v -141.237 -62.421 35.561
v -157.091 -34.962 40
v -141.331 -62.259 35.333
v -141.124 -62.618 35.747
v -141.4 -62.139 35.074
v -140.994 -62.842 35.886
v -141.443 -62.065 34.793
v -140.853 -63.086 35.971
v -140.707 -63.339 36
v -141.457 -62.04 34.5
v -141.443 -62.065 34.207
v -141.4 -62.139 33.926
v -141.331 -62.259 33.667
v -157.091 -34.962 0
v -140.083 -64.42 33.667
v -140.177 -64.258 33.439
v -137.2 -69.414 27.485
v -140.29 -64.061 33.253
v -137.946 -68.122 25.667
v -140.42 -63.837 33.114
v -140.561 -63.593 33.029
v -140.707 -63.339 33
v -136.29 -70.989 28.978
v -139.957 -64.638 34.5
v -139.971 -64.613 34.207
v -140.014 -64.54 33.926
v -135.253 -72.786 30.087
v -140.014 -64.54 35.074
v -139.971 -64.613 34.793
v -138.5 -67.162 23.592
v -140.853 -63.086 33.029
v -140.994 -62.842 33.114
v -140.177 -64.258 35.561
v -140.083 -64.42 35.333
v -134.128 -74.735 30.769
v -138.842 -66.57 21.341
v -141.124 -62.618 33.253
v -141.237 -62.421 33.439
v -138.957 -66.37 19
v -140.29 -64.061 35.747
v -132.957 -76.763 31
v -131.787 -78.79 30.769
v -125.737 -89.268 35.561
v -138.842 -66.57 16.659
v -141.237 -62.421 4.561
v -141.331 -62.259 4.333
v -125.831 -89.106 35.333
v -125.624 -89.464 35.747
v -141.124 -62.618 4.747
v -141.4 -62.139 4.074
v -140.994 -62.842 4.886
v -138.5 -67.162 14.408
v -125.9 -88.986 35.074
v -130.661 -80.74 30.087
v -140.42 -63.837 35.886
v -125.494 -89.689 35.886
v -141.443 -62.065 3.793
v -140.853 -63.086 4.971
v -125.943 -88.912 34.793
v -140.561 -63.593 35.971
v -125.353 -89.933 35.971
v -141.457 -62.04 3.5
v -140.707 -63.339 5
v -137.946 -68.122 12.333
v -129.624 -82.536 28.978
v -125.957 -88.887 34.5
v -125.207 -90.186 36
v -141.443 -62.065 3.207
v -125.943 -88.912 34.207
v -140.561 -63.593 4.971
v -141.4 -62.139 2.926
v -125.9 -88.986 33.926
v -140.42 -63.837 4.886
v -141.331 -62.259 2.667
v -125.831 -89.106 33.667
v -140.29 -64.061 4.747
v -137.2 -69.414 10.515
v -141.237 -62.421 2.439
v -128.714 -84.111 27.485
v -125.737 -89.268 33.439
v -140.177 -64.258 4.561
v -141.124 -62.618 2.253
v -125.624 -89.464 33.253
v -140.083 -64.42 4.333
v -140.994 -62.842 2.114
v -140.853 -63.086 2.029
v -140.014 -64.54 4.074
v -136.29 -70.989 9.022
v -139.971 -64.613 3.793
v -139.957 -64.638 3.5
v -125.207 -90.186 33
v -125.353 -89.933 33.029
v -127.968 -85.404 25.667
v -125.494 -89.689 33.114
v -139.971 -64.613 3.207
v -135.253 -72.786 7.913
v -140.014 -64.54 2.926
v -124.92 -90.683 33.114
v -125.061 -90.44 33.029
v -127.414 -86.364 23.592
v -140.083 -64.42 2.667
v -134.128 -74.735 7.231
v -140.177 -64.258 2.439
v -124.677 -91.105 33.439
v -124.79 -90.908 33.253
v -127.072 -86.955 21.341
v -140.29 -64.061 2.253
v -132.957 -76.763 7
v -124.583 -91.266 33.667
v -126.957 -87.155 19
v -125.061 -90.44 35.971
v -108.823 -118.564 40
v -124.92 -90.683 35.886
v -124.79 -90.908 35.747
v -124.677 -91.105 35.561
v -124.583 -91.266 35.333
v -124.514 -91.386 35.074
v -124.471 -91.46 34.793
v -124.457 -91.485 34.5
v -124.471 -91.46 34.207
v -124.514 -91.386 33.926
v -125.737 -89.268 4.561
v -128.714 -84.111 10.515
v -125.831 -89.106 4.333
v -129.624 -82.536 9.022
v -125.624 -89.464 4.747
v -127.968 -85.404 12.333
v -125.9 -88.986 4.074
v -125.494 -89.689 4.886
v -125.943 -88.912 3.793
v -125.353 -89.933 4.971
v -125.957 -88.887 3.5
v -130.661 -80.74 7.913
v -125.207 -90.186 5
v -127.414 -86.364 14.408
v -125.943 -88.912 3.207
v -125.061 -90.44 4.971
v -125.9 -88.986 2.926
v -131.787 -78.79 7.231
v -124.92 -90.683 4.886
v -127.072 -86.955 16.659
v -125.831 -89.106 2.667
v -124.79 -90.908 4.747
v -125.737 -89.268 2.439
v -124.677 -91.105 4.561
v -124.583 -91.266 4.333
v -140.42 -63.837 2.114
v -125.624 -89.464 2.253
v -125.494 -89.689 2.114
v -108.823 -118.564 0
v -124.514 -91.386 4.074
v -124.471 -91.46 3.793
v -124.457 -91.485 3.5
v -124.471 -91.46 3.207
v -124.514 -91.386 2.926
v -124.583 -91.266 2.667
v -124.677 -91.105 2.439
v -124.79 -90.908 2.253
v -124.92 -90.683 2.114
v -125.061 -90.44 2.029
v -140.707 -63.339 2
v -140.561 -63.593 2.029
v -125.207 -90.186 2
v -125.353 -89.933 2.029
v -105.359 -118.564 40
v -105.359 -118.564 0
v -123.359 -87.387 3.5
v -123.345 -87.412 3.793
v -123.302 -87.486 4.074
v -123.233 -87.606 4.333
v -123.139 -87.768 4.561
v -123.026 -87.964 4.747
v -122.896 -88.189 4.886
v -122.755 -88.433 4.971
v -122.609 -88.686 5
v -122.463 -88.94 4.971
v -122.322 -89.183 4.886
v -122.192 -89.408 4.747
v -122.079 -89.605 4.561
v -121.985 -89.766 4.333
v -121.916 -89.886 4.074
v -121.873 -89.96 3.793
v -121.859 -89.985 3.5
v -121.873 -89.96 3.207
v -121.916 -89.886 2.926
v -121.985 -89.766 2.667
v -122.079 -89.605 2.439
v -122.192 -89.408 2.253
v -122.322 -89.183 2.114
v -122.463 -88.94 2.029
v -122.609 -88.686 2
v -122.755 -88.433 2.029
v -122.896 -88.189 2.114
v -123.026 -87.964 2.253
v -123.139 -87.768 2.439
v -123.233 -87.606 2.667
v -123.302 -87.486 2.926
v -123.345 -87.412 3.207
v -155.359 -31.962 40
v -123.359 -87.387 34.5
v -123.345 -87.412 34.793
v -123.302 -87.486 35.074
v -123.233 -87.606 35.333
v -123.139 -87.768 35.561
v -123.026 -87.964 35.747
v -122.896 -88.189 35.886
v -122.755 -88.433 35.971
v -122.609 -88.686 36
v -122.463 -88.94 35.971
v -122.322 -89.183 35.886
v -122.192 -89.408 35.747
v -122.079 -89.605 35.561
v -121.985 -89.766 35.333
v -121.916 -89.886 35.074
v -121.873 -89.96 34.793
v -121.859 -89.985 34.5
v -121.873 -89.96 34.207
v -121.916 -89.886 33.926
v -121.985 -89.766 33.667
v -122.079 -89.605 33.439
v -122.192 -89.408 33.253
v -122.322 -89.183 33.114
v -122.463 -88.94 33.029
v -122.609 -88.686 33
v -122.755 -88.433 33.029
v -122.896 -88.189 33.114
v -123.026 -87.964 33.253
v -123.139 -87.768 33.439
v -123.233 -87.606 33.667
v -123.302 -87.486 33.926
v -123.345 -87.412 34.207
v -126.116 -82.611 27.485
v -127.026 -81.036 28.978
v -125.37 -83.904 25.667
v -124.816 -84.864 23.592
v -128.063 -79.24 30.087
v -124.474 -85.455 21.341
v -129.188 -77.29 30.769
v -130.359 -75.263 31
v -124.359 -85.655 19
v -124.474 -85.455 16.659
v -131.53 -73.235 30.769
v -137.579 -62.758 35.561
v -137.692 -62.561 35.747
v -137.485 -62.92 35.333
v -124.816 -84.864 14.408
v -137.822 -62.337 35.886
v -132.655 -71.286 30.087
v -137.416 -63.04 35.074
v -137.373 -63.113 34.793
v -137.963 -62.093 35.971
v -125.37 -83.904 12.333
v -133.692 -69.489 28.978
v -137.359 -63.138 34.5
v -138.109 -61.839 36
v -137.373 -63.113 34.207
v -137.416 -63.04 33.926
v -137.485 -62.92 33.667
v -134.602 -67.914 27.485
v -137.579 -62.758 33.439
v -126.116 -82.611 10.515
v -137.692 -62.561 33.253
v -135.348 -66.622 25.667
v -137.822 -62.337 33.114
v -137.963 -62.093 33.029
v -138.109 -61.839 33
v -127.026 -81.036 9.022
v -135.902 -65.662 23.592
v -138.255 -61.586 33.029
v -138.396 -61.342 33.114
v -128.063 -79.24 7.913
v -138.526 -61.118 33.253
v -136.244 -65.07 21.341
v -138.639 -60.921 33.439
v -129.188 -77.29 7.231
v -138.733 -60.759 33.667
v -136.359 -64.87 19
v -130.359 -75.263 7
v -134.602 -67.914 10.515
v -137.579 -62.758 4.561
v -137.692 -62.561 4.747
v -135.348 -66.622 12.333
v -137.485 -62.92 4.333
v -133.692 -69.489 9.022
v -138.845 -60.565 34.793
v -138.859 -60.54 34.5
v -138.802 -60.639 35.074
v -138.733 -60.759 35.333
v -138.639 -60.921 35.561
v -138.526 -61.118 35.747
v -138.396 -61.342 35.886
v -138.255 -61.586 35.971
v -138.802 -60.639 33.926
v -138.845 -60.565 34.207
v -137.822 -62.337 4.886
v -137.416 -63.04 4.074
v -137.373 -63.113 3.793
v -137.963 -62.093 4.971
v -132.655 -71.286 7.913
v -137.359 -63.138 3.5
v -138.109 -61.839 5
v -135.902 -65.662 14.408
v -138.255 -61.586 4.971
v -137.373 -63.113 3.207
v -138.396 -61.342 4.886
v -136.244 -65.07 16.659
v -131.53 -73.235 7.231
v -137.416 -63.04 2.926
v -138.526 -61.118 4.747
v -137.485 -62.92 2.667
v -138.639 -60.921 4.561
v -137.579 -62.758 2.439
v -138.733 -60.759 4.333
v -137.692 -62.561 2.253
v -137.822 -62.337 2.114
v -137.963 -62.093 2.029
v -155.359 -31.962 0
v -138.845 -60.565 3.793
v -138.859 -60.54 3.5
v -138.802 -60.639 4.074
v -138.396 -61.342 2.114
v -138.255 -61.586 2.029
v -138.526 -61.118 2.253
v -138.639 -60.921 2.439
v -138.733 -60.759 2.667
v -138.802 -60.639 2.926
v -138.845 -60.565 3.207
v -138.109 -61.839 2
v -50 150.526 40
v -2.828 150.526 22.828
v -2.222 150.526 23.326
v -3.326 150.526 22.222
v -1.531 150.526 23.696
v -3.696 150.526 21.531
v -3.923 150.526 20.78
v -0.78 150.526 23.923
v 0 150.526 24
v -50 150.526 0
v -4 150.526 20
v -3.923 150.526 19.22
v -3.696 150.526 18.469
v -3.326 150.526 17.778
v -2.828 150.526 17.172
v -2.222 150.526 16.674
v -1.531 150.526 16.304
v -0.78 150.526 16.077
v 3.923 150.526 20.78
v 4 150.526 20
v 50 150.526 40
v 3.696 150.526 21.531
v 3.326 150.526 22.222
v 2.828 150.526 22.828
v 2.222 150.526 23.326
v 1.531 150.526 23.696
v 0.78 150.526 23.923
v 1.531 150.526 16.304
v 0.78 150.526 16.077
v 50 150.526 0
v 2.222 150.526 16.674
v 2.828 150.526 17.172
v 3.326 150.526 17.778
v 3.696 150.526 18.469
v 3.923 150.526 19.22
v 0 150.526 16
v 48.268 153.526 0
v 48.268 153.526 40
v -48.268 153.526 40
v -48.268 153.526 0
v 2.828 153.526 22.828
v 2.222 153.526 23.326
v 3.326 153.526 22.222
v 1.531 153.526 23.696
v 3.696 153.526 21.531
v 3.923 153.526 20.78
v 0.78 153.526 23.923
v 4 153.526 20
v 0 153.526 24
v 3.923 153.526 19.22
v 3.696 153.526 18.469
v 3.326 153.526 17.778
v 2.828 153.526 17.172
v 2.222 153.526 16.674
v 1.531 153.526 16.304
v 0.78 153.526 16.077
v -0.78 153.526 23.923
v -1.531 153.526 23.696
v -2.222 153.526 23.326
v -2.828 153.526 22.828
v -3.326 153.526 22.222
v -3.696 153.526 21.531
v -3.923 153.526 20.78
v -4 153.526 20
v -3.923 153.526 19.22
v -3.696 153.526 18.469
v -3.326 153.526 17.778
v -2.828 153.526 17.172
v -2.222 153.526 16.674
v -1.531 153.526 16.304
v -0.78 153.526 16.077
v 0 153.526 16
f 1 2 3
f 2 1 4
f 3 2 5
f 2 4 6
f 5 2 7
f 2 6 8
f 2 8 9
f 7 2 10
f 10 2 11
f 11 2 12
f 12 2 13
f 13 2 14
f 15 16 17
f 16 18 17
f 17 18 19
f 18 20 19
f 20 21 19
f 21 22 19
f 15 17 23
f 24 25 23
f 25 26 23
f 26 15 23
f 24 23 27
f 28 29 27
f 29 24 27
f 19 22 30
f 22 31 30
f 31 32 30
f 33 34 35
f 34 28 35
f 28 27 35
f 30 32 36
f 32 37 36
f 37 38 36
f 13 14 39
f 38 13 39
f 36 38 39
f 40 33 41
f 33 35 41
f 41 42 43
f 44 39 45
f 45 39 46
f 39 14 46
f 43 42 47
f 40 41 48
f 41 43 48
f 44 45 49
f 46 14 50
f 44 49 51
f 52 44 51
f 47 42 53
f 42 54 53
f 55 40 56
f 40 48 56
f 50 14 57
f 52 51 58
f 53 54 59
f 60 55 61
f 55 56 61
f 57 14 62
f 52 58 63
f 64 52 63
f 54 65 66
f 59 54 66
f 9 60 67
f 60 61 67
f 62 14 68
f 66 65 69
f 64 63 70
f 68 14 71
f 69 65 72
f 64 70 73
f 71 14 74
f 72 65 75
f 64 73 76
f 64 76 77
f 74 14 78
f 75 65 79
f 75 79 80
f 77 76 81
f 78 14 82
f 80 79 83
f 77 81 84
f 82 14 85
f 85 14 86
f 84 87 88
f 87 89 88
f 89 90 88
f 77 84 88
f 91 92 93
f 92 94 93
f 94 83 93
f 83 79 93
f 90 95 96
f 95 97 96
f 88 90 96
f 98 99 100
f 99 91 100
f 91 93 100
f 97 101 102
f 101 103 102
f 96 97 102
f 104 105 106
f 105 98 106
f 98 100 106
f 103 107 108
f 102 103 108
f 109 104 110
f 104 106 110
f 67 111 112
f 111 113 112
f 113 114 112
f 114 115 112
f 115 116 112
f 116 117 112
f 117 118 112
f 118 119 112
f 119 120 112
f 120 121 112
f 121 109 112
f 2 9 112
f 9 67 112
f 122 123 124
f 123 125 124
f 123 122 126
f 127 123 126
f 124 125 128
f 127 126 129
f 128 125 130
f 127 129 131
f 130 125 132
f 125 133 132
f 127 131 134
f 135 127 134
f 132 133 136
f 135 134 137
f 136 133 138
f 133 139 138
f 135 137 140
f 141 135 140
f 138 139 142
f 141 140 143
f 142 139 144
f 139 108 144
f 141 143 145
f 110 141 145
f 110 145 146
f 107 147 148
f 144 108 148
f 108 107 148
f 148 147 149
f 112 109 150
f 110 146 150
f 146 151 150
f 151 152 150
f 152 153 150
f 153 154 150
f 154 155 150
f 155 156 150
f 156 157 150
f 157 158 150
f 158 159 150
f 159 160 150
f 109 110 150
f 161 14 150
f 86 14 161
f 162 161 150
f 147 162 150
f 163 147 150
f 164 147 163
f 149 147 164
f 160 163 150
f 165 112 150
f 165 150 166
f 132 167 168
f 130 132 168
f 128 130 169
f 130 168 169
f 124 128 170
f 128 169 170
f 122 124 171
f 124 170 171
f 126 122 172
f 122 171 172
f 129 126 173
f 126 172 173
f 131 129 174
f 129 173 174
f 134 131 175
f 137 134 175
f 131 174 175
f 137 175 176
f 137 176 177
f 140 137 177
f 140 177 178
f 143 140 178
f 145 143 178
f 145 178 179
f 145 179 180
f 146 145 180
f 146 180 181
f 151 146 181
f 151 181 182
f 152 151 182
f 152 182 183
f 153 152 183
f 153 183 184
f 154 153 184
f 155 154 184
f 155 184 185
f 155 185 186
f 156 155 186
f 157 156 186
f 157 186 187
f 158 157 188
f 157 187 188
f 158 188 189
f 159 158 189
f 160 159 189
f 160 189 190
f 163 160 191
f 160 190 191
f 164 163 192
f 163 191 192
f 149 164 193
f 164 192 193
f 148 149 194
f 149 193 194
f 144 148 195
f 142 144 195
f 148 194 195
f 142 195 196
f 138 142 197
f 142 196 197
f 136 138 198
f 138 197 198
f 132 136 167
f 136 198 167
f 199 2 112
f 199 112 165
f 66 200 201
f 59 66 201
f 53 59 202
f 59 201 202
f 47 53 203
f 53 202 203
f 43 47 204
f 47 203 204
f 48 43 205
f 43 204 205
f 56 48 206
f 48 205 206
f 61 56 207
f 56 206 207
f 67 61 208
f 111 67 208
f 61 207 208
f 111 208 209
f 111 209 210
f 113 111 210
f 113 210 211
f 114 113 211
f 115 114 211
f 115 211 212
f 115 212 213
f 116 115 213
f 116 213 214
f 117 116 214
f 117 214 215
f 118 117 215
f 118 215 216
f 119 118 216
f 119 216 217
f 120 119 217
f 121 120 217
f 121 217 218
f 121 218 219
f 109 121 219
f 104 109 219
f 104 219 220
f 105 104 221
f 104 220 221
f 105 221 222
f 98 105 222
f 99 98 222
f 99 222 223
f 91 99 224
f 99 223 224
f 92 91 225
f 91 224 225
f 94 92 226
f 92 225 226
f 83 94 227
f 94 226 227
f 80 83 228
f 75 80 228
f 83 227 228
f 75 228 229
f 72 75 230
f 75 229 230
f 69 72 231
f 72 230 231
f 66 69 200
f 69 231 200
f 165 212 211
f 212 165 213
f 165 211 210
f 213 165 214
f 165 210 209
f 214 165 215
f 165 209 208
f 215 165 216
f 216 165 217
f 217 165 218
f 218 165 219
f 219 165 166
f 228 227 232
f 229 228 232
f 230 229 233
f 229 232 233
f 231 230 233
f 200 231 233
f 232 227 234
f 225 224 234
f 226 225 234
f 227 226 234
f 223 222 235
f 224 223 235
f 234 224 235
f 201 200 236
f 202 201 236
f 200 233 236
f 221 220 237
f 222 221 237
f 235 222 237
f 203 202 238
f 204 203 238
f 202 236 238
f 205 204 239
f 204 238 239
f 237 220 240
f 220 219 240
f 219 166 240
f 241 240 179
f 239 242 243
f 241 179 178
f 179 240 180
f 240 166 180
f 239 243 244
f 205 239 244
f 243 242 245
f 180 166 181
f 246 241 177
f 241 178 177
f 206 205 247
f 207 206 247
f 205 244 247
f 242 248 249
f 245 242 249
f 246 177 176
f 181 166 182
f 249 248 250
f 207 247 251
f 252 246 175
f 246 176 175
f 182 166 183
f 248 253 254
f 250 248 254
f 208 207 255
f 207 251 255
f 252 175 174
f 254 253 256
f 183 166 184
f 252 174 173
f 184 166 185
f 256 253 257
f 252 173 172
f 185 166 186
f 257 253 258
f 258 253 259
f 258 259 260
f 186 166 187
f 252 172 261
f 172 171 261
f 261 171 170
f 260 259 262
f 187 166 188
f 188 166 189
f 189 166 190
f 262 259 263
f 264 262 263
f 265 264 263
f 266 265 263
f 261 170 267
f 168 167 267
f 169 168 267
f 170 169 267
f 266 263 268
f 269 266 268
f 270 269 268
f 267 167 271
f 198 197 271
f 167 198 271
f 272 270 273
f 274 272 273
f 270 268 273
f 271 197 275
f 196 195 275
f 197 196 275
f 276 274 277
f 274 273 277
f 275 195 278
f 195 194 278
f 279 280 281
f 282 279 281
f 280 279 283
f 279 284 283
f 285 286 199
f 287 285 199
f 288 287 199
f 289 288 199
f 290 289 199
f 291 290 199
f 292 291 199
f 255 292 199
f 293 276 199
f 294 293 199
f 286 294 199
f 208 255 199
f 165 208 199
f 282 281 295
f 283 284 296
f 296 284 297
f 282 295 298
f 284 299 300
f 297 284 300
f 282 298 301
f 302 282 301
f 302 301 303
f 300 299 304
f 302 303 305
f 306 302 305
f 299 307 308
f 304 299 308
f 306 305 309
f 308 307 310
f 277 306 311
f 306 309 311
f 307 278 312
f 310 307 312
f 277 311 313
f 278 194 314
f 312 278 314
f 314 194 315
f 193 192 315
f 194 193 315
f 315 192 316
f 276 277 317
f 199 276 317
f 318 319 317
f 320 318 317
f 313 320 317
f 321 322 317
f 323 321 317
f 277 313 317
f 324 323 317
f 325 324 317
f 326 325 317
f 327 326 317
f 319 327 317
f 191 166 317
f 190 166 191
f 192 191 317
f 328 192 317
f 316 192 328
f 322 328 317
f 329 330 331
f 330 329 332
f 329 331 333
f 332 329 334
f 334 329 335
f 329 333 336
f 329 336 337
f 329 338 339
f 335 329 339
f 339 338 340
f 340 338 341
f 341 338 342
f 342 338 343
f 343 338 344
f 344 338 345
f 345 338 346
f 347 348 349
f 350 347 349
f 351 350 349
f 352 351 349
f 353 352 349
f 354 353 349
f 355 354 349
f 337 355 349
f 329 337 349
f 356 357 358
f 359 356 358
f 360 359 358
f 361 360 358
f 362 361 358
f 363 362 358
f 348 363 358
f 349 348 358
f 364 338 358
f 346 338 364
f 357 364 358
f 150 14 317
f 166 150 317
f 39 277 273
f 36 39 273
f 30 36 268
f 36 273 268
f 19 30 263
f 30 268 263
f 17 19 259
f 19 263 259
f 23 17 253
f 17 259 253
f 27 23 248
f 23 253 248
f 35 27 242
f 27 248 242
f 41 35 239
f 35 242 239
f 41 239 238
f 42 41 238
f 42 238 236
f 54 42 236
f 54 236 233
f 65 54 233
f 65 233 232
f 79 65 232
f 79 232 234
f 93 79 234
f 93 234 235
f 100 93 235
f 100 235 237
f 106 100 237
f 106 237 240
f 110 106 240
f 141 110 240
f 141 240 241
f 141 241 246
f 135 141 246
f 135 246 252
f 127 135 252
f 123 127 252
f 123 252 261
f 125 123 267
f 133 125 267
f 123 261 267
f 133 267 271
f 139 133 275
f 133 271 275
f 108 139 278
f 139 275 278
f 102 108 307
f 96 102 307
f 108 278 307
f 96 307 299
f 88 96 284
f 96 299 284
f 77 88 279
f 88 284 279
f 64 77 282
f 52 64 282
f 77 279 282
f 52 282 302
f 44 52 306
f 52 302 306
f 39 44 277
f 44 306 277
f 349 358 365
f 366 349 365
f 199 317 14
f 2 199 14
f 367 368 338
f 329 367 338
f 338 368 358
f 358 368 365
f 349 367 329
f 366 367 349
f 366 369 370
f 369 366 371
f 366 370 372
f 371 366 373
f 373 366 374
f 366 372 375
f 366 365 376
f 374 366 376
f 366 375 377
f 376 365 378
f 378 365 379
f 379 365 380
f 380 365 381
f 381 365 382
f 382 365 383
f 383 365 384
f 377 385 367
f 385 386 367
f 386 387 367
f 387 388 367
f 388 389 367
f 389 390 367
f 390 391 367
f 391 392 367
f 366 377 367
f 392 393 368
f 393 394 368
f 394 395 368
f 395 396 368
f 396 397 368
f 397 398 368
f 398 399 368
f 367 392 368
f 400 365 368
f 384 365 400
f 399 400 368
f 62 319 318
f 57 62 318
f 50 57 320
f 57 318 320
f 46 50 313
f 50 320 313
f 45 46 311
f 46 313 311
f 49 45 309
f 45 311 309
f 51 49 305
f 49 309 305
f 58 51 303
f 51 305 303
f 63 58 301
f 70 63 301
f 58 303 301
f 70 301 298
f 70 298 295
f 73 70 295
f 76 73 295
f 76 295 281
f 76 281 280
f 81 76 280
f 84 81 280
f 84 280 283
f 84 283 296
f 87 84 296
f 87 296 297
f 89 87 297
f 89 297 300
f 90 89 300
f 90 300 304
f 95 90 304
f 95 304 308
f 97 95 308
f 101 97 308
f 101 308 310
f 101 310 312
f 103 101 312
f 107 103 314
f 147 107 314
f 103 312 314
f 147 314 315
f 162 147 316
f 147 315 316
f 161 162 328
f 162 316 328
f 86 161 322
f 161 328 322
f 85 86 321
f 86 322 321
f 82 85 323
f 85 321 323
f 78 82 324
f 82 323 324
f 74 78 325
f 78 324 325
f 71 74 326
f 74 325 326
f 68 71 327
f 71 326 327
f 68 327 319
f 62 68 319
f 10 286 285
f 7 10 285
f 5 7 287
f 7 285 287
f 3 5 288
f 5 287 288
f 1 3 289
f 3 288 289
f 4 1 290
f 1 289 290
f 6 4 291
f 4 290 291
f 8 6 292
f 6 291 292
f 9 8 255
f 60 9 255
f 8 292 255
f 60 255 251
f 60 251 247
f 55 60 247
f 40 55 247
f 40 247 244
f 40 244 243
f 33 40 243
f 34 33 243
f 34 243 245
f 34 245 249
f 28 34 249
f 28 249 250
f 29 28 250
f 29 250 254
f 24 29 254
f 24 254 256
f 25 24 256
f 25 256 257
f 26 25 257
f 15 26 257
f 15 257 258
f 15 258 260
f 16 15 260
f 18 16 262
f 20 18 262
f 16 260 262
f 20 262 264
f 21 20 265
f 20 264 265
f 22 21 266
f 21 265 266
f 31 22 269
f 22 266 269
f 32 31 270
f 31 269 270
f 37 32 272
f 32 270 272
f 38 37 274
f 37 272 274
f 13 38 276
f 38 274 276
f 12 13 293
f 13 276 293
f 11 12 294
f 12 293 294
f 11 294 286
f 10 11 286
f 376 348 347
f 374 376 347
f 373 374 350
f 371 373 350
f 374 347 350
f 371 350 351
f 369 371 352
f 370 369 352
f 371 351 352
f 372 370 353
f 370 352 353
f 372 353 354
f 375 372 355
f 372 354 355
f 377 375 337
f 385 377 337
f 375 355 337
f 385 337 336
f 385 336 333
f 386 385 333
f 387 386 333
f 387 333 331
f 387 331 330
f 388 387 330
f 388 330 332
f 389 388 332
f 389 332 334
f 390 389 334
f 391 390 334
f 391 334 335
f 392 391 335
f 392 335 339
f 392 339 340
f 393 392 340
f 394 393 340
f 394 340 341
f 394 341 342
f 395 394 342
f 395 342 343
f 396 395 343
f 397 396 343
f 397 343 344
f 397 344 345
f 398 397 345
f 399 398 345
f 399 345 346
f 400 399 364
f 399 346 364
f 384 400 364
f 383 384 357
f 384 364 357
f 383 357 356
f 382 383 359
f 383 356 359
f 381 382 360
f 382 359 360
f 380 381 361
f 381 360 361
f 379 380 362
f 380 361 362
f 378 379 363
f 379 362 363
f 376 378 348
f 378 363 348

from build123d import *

# Parameters (mm, degrees)
F2_DEPTH = 40
F3_R     = 12
F3_R_2   = 1.5
F4_DEPTH = 25
F5_R     = 4
F6_DEPTH = 25


with BuildPart() as f2:
    # F1 (on face) → F2 (new body)
    with BuildSketch(Plane.XY):
        Polygon((-155.3589838486, -31.9615242271), (-157.0910346562, -34.9615242271), (-108.8230854638, -118.5640646055), (-105.3589838486, -118.5640646055), align=None)
    extrude(amount=F2_DEPTH)

    # F3 (on face) → F4 (cut)
    with BuildSketch(Plane(origin=(-130.3589838486, -75.2627944163, 0), x_dir=(-0.5, 0.8660254038, 0), z_dir=(0.8660254038, 0.5, 0))):
        with Locations((0, 19)):
            Circle(F3_R)
        with Locations((-15.5, 34.5)):
            Circle(F3_R_2)
        with Locations((15.5, 34.5)):
            Circle(F3_R_2)
        with Locations((15.5, 3.5)):
            Circle(F3_R_2)
        with Locations((-15.5, 3.5)):
            Circle(F3_R_2)
    extrude(amount=-F4_DEPTH, mode=Mode.SUBTRACT)


with BuildPart() as f2b:
    # F1 (on face) → F2, piece 2 (new body)
    with BuildSketch(Plane.XY):
        Polygon((-48.2679491924, 153.5255888326), (-50, 150.5255888326), (50, 150.5255888326), (48.2679491924, 153.5255888326), align=None)
    extrude(amount=F2_DEPTH)

    # F5 (on face) → F6 (cut)
    with BuildSketch(Plane.XZ.offset(-150.5255888326)):
        with Locations((0, 20)):
            Circle(F5_R)
    extrude(amount=-F6_DEPTH, mode=Mode.SUBTRACT)


solid = Compound([f2.part, f2b.part])
